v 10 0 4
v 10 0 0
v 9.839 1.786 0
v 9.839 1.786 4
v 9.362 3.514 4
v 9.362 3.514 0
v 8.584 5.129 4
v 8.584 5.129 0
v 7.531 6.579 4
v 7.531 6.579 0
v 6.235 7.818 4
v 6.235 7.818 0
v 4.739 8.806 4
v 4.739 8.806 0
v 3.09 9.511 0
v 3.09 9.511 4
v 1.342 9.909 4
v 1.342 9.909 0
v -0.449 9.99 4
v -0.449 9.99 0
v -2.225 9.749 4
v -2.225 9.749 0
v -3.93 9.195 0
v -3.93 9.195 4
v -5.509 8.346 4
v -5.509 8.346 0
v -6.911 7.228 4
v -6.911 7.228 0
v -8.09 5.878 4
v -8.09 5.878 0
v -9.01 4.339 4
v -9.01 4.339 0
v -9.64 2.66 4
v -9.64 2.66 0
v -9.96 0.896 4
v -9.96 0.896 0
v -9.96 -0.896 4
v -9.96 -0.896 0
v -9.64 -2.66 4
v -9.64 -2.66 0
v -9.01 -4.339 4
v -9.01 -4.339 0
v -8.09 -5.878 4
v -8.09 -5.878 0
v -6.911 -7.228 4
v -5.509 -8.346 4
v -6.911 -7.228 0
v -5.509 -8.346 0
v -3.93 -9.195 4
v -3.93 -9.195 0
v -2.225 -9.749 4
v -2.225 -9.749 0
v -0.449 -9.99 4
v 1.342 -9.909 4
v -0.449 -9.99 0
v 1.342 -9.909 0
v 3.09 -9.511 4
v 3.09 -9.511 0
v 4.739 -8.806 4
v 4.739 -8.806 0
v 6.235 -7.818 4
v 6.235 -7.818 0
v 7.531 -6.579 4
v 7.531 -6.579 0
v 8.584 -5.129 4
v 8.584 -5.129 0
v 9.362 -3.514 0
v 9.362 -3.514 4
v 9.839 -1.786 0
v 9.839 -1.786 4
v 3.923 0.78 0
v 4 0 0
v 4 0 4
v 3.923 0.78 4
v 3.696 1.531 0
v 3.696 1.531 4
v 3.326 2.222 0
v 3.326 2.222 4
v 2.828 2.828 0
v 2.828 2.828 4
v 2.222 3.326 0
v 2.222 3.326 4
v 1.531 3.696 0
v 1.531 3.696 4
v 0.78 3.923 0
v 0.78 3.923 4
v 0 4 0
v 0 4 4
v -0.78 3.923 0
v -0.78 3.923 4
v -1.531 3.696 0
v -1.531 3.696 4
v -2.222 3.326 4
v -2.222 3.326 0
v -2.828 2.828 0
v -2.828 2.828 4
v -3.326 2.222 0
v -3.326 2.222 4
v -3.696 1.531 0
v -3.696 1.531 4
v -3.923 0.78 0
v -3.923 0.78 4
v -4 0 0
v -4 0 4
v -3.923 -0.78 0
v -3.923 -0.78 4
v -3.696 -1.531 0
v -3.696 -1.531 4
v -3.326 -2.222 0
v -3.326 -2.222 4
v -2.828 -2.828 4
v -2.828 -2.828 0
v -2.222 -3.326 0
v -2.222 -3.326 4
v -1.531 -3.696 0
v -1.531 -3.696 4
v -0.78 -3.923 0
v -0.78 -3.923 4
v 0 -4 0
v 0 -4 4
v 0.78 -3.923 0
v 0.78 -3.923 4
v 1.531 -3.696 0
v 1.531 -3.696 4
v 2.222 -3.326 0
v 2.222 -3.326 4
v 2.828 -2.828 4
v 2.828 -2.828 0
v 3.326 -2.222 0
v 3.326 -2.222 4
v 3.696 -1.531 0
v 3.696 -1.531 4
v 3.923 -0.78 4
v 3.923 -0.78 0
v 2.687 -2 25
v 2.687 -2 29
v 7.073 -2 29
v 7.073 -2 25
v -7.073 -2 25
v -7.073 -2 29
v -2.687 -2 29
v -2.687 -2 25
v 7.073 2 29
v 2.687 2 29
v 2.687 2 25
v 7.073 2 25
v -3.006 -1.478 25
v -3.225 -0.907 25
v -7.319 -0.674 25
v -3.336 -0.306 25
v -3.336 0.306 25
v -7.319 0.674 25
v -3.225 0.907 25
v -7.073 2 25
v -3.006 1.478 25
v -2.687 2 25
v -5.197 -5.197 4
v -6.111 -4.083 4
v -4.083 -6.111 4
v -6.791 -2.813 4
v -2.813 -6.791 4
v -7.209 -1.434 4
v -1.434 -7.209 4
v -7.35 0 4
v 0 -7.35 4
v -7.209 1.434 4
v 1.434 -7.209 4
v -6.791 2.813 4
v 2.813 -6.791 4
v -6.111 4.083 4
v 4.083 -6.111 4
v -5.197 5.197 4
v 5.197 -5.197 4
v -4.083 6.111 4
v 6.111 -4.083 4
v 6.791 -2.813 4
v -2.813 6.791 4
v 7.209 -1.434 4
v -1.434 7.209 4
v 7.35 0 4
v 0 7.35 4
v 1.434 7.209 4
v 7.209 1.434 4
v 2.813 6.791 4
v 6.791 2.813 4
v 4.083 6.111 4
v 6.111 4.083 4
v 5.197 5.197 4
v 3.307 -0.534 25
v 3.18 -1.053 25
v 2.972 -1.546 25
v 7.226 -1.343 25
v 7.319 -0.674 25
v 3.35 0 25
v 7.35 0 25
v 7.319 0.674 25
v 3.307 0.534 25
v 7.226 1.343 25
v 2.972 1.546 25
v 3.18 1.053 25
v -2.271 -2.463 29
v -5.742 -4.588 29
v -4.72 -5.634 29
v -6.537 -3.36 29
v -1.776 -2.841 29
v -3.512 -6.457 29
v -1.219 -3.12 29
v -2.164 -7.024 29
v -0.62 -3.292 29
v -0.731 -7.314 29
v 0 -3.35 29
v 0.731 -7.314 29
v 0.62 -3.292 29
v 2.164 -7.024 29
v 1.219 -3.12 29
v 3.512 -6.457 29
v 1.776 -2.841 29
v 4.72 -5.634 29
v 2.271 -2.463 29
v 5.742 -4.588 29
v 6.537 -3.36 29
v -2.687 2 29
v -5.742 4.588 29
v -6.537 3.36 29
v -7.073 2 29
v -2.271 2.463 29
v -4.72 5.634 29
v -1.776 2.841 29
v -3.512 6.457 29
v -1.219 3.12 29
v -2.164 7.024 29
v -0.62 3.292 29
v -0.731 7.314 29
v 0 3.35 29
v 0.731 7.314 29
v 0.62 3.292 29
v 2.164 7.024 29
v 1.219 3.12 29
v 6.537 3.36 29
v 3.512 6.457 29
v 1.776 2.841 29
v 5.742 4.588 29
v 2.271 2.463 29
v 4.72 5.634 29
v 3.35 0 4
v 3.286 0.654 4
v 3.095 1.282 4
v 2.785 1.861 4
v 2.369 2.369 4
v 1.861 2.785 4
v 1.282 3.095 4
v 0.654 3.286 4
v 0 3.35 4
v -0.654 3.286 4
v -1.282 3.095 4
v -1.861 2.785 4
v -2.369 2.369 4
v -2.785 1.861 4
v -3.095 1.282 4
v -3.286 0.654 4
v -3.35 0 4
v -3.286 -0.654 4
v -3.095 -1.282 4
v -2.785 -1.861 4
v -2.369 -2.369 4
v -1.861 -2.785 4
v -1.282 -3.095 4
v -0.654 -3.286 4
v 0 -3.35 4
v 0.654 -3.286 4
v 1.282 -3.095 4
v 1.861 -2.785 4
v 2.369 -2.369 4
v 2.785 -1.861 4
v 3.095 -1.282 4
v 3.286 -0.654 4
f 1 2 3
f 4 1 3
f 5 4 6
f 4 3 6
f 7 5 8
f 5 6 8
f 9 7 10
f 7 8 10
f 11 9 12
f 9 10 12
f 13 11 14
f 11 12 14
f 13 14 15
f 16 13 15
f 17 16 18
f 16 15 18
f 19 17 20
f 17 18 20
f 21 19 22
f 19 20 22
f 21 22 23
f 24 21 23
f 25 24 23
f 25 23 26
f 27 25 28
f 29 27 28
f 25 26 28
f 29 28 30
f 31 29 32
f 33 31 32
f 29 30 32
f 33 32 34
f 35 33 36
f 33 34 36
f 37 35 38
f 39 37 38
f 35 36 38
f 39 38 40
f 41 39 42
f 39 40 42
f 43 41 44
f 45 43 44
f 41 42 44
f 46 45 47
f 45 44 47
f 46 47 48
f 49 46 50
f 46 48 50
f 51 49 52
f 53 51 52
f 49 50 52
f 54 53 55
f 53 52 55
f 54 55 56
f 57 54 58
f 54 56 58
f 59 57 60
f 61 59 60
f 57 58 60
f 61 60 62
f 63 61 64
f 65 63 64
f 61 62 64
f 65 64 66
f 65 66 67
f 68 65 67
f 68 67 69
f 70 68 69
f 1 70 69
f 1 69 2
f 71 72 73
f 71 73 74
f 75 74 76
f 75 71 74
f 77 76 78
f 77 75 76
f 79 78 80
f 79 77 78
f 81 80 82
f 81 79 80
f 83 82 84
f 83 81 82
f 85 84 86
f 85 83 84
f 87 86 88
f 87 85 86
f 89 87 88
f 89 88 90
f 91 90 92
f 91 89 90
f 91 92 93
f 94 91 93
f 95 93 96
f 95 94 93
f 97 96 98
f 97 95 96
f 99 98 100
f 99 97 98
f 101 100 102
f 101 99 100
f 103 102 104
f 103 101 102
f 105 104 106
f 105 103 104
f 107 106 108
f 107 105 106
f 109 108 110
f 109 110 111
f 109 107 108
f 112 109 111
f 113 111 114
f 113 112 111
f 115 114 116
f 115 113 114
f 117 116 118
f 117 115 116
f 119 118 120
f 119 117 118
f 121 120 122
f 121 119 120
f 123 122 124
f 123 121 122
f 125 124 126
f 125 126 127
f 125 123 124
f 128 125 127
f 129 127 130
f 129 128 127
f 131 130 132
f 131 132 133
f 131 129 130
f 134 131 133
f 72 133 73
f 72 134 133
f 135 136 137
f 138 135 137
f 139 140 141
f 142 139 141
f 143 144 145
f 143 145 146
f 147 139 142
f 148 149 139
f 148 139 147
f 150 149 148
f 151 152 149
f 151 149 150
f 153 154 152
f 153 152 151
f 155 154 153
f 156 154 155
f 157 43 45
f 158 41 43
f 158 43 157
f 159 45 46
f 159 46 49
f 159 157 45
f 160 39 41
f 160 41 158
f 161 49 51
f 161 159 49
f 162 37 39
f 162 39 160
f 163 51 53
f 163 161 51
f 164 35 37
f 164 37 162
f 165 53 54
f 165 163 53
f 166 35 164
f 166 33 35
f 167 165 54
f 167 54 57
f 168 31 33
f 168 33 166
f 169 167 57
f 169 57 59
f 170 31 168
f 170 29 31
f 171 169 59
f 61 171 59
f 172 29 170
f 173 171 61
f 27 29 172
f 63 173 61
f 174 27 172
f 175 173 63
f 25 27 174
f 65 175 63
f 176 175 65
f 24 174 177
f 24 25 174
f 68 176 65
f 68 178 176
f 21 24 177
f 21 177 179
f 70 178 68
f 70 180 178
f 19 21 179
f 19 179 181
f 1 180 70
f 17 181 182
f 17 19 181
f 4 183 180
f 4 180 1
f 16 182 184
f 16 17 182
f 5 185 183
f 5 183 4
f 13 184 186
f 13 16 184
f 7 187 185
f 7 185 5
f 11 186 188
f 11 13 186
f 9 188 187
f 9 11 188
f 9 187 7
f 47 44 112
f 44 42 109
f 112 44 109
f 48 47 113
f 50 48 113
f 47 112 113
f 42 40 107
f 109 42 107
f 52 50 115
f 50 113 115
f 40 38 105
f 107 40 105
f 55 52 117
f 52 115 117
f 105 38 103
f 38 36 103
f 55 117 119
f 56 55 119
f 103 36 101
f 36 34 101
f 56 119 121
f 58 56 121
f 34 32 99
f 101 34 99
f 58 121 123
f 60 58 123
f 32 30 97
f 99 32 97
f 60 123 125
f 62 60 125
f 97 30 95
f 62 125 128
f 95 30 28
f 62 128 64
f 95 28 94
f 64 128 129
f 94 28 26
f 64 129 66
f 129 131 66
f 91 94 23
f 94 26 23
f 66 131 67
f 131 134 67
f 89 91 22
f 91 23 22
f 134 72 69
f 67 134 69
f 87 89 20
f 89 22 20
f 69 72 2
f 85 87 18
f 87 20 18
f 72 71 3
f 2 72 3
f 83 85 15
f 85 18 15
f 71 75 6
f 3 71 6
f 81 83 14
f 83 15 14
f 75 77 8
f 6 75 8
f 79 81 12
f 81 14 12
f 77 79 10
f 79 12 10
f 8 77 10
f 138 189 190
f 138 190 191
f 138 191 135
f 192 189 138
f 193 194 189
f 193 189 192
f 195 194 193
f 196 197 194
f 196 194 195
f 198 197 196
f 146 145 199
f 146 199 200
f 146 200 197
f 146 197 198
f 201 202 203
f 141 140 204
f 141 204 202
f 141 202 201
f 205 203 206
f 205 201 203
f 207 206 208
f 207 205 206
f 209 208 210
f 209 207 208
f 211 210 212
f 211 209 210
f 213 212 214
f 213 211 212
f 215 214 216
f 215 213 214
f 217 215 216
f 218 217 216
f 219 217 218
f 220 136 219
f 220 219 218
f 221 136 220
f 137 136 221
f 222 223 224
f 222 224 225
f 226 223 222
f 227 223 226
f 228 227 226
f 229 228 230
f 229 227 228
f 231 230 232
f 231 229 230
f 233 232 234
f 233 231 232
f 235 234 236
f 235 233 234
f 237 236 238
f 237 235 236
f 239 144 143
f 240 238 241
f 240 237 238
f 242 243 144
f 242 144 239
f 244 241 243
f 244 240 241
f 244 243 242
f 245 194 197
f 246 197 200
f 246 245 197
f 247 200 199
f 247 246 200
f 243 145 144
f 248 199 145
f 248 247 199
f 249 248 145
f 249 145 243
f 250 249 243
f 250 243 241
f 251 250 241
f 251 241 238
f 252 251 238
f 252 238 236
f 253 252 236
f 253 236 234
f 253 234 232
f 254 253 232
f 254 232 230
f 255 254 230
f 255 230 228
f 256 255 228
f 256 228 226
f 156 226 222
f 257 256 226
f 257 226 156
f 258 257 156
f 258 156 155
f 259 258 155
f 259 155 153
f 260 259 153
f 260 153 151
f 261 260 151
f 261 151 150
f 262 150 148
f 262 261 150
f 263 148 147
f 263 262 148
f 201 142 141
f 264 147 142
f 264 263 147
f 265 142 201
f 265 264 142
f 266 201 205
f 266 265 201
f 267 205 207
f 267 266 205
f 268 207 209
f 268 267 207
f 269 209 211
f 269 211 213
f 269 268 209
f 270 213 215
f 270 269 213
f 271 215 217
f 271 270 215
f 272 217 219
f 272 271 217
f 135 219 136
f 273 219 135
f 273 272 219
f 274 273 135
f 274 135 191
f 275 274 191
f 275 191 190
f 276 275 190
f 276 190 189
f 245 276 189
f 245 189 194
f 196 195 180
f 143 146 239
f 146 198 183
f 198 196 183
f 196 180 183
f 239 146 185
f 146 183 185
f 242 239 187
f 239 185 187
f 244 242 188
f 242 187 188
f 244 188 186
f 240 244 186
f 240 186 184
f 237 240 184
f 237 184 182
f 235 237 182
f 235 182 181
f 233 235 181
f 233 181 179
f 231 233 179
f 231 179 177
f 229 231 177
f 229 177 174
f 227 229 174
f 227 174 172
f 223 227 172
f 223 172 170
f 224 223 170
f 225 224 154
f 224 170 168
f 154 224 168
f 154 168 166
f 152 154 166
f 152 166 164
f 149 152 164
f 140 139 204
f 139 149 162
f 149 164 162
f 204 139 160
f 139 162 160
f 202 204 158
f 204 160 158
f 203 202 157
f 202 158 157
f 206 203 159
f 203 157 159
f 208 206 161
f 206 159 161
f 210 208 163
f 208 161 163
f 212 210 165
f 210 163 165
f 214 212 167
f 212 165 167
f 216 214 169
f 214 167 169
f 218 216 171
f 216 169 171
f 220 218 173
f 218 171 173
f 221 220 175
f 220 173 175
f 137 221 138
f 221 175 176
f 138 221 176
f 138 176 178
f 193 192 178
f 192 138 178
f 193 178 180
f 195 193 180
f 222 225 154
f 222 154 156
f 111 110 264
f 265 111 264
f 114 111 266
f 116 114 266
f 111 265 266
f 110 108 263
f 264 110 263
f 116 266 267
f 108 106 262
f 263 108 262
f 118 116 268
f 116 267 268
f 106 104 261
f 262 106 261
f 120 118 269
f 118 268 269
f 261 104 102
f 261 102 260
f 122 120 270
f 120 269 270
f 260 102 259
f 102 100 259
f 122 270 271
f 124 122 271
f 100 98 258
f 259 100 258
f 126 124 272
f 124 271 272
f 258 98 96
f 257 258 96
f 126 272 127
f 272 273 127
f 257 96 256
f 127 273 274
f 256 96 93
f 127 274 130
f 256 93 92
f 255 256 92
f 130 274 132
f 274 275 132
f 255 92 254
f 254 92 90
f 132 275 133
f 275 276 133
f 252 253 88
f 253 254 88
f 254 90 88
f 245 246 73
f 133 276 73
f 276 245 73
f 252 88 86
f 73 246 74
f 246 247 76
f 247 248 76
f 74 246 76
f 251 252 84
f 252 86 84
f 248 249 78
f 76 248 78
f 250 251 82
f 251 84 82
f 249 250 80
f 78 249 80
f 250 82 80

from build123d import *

# Parameters (mm, degrees)
SKETCH_1_R          = 10
SKETCH_1_R_2        = 4
EXTRUDE_1_DEPTH     = 4
SKETCH_2_R          = 7.35
SKETCH_2_R_2        = 3.35
EXTRUDE_2_DEPTH     = 25
SKETCH_3_W          = 15.774529682
SKETCH_3_H          = 4
CUT_EXTRUDE_1_DEPTH = 4


with BuildPart() as part:
    # 草图1 → 拉伸-薄壁1 (new body)
    with BuildSketch(Plane.XY):
        Circle(SKETCH_1_R)
        Circle(SKETCH_1_R_2, mode=Mode.SUBTRACT)
    extrude(amount=EXTRUDE_1_DEPTH)

    # 草图2 → 拉伸-薄壁2 (add)
    with BuildSketch(Plane.XY.offset(4)):
        Circle(SKETCH_2_R)
        Circle(SKETCH_2_R_2, mode=Mode.SUBTRACT)
    extrude(amount=EXTRUDE_2_DEPTH)

    # 草图3 → 切除-拉伸1 (cut)
    with BuildSketch(Plane.XY.offset(29)):
        Rectangle(SKETCH_3_W, SKETCH_3_H)
    extrude(amount=-CUT_EXTRUDE_1_DEPTH, mode=Mode.SUBTRACT)


solid = part.part
